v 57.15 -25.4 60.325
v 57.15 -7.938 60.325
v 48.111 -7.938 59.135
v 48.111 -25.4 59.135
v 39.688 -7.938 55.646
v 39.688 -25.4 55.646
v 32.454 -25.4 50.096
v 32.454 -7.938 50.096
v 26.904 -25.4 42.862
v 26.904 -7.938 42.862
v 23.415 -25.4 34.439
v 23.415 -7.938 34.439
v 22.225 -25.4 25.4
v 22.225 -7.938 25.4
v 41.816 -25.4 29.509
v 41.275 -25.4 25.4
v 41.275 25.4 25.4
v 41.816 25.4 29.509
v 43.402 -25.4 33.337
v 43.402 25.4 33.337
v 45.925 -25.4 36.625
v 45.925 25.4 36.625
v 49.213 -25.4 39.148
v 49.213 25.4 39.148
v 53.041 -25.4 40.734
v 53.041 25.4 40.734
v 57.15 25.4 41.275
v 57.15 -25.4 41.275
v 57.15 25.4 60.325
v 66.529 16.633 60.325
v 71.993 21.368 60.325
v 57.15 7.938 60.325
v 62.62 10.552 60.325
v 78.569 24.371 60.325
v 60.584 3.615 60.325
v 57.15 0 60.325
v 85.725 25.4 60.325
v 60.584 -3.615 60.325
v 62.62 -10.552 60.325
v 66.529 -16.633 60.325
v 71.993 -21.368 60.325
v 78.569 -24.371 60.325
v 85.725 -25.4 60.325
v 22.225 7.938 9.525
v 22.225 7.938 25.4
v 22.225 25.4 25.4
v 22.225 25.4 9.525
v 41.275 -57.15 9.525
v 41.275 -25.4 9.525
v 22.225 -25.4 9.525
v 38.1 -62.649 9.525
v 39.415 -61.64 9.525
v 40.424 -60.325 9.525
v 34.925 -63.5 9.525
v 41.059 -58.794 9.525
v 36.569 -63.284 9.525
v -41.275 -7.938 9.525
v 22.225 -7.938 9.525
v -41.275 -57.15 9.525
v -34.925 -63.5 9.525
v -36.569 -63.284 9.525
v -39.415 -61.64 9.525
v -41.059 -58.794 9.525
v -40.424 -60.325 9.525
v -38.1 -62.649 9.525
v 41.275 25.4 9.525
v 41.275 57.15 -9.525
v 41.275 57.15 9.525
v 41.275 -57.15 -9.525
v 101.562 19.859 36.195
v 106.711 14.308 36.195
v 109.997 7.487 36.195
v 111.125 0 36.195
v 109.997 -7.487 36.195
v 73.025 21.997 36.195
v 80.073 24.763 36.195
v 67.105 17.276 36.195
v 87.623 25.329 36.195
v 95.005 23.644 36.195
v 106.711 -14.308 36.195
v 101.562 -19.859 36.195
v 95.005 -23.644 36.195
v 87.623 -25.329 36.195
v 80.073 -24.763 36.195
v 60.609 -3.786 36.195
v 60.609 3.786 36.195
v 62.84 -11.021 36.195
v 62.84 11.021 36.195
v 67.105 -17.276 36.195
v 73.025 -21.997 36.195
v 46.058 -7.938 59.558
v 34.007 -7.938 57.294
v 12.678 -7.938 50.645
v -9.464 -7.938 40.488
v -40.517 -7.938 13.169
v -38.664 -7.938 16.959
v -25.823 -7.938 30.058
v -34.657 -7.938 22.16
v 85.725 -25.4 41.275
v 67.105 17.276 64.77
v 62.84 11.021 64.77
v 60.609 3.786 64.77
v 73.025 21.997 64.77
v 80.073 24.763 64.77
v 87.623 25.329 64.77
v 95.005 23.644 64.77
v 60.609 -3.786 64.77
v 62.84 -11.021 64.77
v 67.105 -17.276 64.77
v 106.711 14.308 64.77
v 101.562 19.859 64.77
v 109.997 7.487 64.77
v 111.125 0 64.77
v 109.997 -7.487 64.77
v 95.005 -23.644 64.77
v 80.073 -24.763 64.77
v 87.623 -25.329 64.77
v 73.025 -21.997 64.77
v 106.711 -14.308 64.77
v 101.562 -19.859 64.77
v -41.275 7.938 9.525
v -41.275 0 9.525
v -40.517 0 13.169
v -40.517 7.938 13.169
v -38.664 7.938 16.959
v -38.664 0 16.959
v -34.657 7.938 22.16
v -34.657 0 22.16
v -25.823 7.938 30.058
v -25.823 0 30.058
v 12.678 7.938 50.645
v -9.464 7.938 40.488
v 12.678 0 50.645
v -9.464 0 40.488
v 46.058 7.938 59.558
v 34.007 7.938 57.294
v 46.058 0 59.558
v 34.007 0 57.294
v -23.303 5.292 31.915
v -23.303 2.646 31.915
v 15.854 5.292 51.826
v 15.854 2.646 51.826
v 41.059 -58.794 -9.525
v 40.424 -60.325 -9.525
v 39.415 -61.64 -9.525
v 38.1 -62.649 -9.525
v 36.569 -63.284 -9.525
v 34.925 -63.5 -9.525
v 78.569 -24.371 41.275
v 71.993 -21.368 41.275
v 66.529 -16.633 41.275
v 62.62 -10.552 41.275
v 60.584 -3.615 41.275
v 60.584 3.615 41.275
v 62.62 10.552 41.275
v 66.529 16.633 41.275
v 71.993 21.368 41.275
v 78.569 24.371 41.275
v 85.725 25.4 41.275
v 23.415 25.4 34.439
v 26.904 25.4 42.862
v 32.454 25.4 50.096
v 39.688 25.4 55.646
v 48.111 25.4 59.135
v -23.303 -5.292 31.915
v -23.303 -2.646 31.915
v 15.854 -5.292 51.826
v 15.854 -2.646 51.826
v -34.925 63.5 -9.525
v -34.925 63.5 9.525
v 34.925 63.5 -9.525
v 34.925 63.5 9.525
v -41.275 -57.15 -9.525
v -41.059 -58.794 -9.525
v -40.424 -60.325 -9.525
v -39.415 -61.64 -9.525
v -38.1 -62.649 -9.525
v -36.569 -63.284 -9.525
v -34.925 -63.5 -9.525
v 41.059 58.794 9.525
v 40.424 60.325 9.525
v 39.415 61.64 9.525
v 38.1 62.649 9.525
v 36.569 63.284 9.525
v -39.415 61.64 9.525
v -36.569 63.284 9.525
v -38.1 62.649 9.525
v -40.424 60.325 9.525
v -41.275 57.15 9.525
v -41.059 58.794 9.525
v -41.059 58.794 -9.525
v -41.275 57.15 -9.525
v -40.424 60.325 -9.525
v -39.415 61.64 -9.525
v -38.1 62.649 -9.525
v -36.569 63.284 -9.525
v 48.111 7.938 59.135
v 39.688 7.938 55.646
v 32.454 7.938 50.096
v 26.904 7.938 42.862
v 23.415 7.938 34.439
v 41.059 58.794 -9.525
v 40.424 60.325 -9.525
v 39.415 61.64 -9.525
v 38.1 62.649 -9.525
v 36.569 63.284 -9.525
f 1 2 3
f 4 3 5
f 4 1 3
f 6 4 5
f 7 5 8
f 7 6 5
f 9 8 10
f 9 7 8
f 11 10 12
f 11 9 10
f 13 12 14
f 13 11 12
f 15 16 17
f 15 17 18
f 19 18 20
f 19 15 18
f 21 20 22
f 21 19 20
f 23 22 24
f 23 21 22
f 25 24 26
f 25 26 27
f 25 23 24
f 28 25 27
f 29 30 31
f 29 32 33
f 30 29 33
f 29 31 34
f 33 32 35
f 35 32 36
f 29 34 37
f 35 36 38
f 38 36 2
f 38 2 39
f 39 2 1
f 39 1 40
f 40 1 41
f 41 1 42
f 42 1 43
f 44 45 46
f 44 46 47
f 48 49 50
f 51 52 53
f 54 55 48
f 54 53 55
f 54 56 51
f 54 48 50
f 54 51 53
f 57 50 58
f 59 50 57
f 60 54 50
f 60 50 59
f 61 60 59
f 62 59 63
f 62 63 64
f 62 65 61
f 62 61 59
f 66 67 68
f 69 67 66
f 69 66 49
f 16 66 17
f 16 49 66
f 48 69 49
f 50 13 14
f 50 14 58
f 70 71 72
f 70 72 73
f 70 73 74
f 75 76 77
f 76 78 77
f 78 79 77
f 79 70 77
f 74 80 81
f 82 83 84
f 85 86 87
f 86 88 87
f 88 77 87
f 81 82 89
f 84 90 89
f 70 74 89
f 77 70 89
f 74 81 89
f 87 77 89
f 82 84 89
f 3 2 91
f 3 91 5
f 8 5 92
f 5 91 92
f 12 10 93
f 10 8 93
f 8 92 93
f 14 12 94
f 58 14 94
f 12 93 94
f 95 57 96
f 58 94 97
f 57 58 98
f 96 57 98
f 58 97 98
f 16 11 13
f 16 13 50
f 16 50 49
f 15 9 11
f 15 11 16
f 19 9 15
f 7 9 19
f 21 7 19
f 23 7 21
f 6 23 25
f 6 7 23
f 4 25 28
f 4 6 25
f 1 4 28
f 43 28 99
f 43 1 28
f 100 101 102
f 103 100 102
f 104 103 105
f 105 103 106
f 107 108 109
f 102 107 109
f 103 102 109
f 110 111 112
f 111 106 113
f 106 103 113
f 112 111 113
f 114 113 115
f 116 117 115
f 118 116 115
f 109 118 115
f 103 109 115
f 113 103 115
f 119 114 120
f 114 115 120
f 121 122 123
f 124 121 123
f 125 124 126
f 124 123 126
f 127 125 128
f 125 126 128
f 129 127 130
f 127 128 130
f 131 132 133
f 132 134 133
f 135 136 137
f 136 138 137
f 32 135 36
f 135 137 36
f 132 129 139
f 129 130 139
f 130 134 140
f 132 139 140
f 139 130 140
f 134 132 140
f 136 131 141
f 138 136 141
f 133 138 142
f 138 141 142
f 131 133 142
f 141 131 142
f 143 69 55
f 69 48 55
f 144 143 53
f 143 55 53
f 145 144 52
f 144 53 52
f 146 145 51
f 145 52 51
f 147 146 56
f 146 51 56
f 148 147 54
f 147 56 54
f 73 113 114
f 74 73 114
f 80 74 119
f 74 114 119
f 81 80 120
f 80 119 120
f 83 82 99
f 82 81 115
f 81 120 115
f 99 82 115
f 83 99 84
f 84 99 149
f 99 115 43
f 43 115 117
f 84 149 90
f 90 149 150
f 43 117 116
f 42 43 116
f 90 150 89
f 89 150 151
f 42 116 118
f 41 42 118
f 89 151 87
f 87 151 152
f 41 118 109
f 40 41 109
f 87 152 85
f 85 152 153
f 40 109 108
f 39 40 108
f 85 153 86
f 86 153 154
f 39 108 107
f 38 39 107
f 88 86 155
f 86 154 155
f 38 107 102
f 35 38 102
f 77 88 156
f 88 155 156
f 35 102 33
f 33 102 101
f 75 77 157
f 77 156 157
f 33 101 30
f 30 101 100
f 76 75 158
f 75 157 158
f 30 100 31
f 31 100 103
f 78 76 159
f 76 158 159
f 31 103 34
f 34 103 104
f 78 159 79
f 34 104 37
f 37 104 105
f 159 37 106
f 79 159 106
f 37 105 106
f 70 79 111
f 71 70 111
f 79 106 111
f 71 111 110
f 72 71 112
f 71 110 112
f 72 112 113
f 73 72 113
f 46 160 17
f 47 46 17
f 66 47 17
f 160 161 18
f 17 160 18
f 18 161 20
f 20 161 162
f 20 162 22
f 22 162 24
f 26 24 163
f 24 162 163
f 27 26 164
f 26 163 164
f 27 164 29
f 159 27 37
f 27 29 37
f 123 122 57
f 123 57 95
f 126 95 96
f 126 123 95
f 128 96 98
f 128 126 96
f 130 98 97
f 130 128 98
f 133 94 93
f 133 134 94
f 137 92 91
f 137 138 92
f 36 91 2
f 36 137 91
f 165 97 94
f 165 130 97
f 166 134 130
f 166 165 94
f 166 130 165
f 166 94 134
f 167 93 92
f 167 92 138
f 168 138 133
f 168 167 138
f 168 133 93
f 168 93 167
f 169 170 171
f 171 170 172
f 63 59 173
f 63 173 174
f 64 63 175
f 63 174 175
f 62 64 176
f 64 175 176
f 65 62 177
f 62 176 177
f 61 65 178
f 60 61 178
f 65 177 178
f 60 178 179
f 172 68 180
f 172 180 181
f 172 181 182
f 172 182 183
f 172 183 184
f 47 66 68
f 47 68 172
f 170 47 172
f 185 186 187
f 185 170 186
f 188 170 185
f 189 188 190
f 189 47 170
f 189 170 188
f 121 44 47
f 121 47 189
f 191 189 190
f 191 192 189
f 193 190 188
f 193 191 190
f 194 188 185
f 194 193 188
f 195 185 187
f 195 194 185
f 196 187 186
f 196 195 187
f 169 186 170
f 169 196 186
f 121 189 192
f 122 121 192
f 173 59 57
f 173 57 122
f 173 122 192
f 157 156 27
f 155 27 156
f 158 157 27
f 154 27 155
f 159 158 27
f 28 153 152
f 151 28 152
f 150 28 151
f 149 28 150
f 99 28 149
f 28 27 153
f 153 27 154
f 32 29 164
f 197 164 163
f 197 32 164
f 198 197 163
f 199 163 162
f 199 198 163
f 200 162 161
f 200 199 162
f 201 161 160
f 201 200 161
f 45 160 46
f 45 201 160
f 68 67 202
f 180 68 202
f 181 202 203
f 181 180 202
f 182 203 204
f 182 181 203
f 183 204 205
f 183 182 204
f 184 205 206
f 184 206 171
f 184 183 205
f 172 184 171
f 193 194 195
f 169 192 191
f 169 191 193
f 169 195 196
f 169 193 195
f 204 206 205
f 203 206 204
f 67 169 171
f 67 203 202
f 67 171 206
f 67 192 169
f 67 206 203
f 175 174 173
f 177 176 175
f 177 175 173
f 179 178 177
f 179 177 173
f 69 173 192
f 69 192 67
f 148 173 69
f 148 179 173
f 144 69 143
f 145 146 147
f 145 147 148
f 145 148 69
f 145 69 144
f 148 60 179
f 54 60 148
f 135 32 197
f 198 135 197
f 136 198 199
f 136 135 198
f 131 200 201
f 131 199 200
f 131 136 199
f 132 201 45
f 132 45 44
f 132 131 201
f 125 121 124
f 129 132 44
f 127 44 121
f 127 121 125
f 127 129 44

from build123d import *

# Parameters (mm, degrees)
F1_DEPTH = 63.5
F2_DEPTH = 25.4
F3_DEPTH = 7.9375
F0_W     = 25.4
F0_H     = 19.05
F4_DEPTH = 25.4
F6_R     = 6.35


with BuildPart() as f1:
    # F0 (on Front) → F1 (new body, symmetric)
    with BuildSketch(Plane.XZ):
        Polygon((-41.275, 9.525), (-41.275, -9.525), (41.275, -9.525), (41.275, 9.525), (22.225, 9.525), align=None)
    extrude(amount=F1_DEPTH, both=True)

    # F0 (on Front) → F2 (join, symmetric)
    with BuildSketch(Plane.XZ):
        with BuildLine():
            Line((22.225, 9.525), (41.275, 9.525))
            Line((41.275, 9.525), (41.275, 25.4))
            ThreePointArc((41.275, 25.4), (45.9246798487, 36.6253201513), (57.15, 41.275))
            Line((57.15, 41.275), (60.325, 41.275))
            Line((60.325, 41.275), (60.325, 60.325))
            Line((60.325, 60.325), (57.15, 60.325))
            ThreePointArc((57.15, 60.325), (32.4542956671, 50.0957043329), (22.225, 25.4))
            Line((22.225, 25.4), (22.225, 9.525))
        make_face()
    extrude(amount=F2_DEPTH, both=True)

    # F0 (on Front) → F3 (join, symmetric)
    with BuildSketch(Plane.XZ):
        with BuildLine():
            add(Edge.make_bspline(
                [(-41.275, 9.525), (-40.2447469532, 30.1753021777), (21.1324393749, 60.5111531913), (57.15, 60.325)],
                knots=[0, 0, 0, 0, 110.761548495, 110.761548495, 110.761548495, 110.761548495], degree=3))
            Line((-41.275, 9.525), (22.225, 9.525))
            Line((22.225, 9.525), (22.225, 25.4))
            ThreePointArc((22.225, 25.4), (32.4542956671, 50.0957043329), (57.15, 60.325))
        make_face()
    extrude(amount=F3_DEPTH, both=True)

    # F0 (on Front) → F4 (join, symmetric)
    with BuildSketch(Plane.XZ):
        with Locations((73.025, 50.8)):
            Rectangle(F0_W, F0_H)
    extrude(amount=F4_DEPTH, both=True)

    # F0 (on Front) → F5 (revolve)
    with BuildSketch(Plane.XZ):
        Polygon((85.725, 64.77), (85.725, 60.325), (85.725, 41.275), (85.725, 36.195), (111.125, 36.195), (111.125, 64.77), align=None)
    revolve(axis=Axis((85.725, 0, 50.8), (0, 0, -1)))

    # F6
    f6_edges = [f1.edges().sort_by_distance(p)[0] for p in [
        (41.275, -63.5, 0),
        (-41.275, -63.5, 0),
        (41.275, 63.5, 0),
        (-41.275, 63.5, 0),
    ]]
    fillet(f6_edges, radius=F6_R)


solid = f1.part
